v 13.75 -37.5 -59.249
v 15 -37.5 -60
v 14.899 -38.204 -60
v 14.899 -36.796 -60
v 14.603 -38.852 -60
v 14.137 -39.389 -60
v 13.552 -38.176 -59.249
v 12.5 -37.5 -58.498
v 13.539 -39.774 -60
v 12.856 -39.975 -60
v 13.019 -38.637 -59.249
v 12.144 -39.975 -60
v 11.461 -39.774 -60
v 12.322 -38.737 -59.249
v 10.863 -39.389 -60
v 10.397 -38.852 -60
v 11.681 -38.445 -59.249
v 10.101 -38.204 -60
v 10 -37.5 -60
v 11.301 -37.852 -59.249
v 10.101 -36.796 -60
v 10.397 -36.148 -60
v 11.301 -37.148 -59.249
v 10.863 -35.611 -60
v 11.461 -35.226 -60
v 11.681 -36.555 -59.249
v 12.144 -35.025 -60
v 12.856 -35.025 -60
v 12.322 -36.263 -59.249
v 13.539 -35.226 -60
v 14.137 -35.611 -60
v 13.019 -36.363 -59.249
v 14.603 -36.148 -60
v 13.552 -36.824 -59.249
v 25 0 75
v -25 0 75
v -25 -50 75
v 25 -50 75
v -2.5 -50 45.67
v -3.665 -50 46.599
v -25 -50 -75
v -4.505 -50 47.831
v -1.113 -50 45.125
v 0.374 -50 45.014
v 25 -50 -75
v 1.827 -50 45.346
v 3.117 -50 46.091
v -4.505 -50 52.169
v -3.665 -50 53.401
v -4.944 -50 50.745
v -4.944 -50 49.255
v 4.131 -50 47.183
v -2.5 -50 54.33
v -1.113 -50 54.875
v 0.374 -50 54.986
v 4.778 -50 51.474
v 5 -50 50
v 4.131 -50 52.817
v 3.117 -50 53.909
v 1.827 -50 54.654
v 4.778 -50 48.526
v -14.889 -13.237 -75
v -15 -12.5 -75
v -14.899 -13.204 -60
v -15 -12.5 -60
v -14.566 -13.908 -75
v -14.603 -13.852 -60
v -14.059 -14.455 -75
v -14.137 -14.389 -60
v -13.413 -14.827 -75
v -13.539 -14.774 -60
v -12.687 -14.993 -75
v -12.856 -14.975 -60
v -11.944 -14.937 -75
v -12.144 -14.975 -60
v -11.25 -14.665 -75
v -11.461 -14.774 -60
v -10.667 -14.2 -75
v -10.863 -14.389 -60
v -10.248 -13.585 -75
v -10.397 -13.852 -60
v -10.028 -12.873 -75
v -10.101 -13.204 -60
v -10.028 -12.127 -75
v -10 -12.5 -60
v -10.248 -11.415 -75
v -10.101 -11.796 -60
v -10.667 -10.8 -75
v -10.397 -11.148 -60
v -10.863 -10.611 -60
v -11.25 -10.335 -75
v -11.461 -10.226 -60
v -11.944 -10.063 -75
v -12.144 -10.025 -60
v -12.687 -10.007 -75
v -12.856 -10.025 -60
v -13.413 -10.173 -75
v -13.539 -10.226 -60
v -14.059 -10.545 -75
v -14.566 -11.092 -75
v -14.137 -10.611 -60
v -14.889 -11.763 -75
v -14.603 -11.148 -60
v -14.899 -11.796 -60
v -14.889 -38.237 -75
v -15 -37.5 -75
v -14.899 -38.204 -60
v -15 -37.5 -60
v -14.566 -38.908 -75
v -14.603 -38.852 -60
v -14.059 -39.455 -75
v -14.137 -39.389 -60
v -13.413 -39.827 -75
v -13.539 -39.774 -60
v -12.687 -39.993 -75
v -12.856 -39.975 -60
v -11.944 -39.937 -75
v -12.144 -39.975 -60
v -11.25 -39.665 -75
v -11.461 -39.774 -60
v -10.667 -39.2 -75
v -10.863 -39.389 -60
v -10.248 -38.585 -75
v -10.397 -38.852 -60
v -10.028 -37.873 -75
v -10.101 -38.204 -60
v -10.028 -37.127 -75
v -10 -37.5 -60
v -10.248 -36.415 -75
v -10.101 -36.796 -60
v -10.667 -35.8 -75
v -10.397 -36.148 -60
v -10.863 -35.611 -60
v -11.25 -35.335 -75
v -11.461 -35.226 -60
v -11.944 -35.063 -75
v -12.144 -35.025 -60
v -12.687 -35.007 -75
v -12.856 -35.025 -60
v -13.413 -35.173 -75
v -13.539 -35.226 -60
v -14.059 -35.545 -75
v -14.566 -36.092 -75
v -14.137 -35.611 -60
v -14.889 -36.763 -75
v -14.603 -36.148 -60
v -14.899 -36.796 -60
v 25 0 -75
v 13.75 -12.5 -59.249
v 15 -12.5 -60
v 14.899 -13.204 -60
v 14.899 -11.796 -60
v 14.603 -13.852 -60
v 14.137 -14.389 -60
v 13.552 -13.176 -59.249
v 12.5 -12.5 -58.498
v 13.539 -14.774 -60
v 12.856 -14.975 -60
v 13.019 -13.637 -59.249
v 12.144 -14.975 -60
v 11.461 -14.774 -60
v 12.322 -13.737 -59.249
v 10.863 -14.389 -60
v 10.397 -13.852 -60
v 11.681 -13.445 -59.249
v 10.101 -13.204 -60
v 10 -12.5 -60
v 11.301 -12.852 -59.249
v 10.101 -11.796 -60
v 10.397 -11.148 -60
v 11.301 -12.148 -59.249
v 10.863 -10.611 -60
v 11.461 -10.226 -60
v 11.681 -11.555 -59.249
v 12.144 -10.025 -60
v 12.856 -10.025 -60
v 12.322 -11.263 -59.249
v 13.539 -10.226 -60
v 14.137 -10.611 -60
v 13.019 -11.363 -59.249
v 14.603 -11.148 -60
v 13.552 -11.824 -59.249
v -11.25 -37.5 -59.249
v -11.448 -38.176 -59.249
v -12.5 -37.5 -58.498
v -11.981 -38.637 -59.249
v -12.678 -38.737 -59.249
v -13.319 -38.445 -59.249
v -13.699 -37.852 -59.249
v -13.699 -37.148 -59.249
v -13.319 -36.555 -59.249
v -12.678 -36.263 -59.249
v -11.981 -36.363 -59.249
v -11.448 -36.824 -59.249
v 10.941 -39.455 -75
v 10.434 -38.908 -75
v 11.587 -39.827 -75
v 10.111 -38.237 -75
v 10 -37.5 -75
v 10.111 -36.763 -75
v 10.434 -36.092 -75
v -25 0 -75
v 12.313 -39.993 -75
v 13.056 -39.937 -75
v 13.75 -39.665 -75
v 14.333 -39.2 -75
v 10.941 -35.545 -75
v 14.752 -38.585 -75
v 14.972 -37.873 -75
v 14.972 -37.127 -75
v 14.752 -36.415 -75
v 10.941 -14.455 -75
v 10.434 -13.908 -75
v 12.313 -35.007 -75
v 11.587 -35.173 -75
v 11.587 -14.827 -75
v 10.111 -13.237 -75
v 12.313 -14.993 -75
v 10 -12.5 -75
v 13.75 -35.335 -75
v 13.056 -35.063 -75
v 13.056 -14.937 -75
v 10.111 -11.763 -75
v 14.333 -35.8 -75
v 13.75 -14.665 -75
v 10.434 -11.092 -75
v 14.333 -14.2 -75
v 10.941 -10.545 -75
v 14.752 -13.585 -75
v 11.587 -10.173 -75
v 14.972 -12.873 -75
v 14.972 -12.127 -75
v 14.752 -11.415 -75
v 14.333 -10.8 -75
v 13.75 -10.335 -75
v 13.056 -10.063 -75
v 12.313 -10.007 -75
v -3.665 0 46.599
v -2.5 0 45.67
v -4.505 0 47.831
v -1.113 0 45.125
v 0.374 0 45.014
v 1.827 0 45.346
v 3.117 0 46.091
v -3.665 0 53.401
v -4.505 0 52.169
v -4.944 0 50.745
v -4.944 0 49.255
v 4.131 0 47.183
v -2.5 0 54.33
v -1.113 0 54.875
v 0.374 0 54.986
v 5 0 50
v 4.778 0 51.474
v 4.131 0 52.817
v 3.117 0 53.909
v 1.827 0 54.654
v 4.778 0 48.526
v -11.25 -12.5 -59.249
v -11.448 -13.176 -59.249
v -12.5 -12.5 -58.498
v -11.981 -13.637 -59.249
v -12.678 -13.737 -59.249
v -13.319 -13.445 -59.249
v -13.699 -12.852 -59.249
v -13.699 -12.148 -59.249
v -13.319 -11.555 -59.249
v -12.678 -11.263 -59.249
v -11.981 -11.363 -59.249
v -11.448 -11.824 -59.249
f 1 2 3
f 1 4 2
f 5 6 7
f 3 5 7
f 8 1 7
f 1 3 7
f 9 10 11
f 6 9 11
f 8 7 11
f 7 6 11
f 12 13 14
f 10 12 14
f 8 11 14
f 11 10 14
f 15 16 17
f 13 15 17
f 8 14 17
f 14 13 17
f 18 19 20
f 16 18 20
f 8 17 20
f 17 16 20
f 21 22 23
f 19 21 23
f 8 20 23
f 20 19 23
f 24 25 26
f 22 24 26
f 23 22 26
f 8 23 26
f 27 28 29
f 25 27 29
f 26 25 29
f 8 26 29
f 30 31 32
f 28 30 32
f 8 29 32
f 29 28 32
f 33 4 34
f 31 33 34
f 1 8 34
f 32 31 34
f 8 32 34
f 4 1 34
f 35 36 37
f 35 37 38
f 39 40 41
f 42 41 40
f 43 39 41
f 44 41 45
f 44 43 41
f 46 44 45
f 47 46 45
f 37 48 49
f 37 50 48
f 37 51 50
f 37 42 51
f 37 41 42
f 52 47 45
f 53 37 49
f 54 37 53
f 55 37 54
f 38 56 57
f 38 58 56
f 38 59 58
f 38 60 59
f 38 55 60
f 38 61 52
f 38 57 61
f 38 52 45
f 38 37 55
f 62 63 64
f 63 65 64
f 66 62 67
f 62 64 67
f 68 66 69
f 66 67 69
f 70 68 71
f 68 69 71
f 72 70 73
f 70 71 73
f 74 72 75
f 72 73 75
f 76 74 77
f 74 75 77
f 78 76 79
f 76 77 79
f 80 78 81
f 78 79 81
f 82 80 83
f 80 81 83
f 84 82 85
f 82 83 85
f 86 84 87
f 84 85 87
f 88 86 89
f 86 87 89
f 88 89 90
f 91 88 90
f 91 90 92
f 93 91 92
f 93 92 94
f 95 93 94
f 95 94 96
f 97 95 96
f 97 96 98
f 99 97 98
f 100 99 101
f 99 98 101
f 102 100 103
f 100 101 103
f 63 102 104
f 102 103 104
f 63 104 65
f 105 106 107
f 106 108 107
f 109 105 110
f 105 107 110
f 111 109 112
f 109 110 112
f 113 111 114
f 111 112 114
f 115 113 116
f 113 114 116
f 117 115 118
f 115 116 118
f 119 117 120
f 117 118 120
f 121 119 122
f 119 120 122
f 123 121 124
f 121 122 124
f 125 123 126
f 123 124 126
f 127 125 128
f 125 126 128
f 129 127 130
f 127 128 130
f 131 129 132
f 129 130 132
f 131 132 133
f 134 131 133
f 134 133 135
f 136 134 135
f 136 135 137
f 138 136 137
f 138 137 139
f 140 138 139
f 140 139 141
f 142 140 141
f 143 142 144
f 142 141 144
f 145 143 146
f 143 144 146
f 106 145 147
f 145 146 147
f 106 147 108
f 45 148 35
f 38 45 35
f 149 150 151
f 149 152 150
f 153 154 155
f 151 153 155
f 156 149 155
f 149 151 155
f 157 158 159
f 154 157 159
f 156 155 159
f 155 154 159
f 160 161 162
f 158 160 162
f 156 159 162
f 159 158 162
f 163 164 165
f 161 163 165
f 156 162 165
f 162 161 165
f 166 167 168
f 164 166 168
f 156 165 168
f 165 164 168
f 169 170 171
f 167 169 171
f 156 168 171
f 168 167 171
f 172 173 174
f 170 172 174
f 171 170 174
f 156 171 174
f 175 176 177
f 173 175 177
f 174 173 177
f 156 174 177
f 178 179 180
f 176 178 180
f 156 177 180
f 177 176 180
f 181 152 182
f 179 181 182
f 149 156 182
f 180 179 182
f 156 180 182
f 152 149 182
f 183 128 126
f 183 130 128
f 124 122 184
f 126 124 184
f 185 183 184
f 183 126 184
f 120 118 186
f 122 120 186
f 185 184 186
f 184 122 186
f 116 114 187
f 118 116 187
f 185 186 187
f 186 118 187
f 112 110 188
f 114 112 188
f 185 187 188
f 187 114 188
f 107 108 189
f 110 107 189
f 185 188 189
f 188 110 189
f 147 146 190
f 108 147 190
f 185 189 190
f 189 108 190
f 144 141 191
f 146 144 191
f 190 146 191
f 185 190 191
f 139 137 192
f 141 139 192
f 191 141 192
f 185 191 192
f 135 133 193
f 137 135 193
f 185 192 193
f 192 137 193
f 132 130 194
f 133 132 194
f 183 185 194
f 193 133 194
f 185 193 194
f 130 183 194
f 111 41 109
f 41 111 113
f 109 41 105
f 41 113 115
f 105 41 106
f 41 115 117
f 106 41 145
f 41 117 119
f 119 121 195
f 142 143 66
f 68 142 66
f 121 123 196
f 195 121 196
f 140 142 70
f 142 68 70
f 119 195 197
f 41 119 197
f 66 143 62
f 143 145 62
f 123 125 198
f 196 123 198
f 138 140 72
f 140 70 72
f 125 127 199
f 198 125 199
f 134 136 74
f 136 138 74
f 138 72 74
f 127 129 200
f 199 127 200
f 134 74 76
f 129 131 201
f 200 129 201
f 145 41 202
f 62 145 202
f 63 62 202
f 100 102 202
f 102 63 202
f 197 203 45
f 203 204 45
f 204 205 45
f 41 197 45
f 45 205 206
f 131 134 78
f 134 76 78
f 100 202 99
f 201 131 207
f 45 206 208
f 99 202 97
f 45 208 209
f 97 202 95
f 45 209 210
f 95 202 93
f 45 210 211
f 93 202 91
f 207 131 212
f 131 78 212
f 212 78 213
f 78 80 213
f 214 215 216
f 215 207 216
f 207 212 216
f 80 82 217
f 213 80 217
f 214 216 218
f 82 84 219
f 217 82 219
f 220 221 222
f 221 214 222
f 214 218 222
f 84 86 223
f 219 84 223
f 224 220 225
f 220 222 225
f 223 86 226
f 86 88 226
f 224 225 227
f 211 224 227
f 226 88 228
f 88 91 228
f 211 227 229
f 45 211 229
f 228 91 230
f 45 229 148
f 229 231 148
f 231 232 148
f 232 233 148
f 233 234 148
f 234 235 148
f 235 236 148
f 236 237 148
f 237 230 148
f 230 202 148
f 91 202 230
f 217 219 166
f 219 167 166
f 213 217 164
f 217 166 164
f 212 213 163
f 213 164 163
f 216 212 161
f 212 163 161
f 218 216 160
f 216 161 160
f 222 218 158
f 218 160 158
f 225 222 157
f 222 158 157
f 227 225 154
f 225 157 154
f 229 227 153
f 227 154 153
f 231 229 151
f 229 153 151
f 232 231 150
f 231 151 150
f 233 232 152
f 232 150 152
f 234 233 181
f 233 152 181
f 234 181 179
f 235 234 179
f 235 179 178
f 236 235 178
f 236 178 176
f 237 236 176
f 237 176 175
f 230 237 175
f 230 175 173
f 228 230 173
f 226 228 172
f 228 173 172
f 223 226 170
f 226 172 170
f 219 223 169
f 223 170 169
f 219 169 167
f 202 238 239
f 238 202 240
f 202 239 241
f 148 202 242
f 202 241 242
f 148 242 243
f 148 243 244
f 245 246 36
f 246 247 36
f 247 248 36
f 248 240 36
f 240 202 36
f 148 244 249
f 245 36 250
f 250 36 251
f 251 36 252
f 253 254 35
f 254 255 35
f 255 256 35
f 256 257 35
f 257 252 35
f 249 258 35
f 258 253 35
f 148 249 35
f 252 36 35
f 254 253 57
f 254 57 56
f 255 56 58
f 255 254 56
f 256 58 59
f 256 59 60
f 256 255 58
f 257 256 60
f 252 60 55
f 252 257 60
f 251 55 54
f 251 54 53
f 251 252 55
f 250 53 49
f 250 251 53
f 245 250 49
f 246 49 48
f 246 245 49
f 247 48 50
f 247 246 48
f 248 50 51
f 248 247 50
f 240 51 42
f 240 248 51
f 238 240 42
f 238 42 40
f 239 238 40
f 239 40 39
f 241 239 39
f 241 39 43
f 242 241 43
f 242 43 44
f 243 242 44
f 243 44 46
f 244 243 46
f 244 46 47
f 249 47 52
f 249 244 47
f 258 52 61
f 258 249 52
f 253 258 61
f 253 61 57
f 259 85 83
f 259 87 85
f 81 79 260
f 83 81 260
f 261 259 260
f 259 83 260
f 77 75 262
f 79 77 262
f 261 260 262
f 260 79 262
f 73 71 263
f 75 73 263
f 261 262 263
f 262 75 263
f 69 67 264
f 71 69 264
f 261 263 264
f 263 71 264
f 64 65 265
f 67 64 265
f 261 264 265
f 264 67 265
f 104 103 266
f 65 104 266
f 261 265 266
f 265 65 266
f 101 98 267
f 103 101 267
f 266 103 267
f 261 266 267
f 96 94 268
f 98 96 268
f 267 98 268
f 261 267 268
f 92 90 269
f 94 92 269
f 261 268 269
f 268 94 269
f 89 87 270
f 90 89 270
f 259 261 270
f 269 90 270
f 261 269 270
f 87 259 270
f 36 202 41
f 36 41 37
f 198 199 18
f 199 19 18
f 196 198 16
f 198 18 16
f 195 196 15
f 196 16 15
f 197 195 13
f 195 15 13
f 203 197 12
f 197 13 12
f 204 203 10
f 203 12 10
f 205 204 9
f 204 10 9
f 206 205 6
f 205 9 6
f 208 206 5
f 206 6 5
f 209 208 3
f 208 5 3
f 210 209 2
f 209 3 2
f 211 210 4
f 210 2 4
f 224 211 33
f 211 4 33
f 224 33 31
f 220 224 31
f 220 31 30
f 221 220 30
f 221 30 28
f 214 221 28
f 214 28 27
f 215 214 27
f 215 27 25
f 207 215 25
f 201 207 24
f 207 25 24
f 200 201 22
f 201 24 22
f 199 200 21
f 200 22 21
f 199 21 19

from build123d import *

# Parameters (mm, degrees)
F0_W     = 50
F0_H     = 150
F0_R     = 5
F1_DEPTH = 50
F3_D     = 5
F3_DEPTH = 15
F3_TIP   = 1.5021515476


with BuildPart() as f1:
    # F0 (on Front) → F1 (new body)
    with BuildSketch(Plane.XZ):
        Rectangle(F0_W, F0_H)
        with Locations((0, 50)):
            Circle(F0_R, mode=Mode.SUBTRACT)
    extrude(amount=F1_DEPTH)

    # F3
    with Locations(Plane(origin=(0, 0, -75), x_dir=(1, 0, 0), z_dir=(0, 0, -1))):
        with Locations((12.5, 37.5), (12.5, 12.5), (-12.5, 12.5), (-12.5, 37.5)):
            Hole(F3_D / 2, depth=F3_DEPTH)
            with Locations((0, 0, -(F3_DEPTH + F3_TIP / 2))):  # 118° drill point
                Cone(0, F3_D / 2, F3_TIP, mode=Mode.SUBTRACT)


solid = f1.part
